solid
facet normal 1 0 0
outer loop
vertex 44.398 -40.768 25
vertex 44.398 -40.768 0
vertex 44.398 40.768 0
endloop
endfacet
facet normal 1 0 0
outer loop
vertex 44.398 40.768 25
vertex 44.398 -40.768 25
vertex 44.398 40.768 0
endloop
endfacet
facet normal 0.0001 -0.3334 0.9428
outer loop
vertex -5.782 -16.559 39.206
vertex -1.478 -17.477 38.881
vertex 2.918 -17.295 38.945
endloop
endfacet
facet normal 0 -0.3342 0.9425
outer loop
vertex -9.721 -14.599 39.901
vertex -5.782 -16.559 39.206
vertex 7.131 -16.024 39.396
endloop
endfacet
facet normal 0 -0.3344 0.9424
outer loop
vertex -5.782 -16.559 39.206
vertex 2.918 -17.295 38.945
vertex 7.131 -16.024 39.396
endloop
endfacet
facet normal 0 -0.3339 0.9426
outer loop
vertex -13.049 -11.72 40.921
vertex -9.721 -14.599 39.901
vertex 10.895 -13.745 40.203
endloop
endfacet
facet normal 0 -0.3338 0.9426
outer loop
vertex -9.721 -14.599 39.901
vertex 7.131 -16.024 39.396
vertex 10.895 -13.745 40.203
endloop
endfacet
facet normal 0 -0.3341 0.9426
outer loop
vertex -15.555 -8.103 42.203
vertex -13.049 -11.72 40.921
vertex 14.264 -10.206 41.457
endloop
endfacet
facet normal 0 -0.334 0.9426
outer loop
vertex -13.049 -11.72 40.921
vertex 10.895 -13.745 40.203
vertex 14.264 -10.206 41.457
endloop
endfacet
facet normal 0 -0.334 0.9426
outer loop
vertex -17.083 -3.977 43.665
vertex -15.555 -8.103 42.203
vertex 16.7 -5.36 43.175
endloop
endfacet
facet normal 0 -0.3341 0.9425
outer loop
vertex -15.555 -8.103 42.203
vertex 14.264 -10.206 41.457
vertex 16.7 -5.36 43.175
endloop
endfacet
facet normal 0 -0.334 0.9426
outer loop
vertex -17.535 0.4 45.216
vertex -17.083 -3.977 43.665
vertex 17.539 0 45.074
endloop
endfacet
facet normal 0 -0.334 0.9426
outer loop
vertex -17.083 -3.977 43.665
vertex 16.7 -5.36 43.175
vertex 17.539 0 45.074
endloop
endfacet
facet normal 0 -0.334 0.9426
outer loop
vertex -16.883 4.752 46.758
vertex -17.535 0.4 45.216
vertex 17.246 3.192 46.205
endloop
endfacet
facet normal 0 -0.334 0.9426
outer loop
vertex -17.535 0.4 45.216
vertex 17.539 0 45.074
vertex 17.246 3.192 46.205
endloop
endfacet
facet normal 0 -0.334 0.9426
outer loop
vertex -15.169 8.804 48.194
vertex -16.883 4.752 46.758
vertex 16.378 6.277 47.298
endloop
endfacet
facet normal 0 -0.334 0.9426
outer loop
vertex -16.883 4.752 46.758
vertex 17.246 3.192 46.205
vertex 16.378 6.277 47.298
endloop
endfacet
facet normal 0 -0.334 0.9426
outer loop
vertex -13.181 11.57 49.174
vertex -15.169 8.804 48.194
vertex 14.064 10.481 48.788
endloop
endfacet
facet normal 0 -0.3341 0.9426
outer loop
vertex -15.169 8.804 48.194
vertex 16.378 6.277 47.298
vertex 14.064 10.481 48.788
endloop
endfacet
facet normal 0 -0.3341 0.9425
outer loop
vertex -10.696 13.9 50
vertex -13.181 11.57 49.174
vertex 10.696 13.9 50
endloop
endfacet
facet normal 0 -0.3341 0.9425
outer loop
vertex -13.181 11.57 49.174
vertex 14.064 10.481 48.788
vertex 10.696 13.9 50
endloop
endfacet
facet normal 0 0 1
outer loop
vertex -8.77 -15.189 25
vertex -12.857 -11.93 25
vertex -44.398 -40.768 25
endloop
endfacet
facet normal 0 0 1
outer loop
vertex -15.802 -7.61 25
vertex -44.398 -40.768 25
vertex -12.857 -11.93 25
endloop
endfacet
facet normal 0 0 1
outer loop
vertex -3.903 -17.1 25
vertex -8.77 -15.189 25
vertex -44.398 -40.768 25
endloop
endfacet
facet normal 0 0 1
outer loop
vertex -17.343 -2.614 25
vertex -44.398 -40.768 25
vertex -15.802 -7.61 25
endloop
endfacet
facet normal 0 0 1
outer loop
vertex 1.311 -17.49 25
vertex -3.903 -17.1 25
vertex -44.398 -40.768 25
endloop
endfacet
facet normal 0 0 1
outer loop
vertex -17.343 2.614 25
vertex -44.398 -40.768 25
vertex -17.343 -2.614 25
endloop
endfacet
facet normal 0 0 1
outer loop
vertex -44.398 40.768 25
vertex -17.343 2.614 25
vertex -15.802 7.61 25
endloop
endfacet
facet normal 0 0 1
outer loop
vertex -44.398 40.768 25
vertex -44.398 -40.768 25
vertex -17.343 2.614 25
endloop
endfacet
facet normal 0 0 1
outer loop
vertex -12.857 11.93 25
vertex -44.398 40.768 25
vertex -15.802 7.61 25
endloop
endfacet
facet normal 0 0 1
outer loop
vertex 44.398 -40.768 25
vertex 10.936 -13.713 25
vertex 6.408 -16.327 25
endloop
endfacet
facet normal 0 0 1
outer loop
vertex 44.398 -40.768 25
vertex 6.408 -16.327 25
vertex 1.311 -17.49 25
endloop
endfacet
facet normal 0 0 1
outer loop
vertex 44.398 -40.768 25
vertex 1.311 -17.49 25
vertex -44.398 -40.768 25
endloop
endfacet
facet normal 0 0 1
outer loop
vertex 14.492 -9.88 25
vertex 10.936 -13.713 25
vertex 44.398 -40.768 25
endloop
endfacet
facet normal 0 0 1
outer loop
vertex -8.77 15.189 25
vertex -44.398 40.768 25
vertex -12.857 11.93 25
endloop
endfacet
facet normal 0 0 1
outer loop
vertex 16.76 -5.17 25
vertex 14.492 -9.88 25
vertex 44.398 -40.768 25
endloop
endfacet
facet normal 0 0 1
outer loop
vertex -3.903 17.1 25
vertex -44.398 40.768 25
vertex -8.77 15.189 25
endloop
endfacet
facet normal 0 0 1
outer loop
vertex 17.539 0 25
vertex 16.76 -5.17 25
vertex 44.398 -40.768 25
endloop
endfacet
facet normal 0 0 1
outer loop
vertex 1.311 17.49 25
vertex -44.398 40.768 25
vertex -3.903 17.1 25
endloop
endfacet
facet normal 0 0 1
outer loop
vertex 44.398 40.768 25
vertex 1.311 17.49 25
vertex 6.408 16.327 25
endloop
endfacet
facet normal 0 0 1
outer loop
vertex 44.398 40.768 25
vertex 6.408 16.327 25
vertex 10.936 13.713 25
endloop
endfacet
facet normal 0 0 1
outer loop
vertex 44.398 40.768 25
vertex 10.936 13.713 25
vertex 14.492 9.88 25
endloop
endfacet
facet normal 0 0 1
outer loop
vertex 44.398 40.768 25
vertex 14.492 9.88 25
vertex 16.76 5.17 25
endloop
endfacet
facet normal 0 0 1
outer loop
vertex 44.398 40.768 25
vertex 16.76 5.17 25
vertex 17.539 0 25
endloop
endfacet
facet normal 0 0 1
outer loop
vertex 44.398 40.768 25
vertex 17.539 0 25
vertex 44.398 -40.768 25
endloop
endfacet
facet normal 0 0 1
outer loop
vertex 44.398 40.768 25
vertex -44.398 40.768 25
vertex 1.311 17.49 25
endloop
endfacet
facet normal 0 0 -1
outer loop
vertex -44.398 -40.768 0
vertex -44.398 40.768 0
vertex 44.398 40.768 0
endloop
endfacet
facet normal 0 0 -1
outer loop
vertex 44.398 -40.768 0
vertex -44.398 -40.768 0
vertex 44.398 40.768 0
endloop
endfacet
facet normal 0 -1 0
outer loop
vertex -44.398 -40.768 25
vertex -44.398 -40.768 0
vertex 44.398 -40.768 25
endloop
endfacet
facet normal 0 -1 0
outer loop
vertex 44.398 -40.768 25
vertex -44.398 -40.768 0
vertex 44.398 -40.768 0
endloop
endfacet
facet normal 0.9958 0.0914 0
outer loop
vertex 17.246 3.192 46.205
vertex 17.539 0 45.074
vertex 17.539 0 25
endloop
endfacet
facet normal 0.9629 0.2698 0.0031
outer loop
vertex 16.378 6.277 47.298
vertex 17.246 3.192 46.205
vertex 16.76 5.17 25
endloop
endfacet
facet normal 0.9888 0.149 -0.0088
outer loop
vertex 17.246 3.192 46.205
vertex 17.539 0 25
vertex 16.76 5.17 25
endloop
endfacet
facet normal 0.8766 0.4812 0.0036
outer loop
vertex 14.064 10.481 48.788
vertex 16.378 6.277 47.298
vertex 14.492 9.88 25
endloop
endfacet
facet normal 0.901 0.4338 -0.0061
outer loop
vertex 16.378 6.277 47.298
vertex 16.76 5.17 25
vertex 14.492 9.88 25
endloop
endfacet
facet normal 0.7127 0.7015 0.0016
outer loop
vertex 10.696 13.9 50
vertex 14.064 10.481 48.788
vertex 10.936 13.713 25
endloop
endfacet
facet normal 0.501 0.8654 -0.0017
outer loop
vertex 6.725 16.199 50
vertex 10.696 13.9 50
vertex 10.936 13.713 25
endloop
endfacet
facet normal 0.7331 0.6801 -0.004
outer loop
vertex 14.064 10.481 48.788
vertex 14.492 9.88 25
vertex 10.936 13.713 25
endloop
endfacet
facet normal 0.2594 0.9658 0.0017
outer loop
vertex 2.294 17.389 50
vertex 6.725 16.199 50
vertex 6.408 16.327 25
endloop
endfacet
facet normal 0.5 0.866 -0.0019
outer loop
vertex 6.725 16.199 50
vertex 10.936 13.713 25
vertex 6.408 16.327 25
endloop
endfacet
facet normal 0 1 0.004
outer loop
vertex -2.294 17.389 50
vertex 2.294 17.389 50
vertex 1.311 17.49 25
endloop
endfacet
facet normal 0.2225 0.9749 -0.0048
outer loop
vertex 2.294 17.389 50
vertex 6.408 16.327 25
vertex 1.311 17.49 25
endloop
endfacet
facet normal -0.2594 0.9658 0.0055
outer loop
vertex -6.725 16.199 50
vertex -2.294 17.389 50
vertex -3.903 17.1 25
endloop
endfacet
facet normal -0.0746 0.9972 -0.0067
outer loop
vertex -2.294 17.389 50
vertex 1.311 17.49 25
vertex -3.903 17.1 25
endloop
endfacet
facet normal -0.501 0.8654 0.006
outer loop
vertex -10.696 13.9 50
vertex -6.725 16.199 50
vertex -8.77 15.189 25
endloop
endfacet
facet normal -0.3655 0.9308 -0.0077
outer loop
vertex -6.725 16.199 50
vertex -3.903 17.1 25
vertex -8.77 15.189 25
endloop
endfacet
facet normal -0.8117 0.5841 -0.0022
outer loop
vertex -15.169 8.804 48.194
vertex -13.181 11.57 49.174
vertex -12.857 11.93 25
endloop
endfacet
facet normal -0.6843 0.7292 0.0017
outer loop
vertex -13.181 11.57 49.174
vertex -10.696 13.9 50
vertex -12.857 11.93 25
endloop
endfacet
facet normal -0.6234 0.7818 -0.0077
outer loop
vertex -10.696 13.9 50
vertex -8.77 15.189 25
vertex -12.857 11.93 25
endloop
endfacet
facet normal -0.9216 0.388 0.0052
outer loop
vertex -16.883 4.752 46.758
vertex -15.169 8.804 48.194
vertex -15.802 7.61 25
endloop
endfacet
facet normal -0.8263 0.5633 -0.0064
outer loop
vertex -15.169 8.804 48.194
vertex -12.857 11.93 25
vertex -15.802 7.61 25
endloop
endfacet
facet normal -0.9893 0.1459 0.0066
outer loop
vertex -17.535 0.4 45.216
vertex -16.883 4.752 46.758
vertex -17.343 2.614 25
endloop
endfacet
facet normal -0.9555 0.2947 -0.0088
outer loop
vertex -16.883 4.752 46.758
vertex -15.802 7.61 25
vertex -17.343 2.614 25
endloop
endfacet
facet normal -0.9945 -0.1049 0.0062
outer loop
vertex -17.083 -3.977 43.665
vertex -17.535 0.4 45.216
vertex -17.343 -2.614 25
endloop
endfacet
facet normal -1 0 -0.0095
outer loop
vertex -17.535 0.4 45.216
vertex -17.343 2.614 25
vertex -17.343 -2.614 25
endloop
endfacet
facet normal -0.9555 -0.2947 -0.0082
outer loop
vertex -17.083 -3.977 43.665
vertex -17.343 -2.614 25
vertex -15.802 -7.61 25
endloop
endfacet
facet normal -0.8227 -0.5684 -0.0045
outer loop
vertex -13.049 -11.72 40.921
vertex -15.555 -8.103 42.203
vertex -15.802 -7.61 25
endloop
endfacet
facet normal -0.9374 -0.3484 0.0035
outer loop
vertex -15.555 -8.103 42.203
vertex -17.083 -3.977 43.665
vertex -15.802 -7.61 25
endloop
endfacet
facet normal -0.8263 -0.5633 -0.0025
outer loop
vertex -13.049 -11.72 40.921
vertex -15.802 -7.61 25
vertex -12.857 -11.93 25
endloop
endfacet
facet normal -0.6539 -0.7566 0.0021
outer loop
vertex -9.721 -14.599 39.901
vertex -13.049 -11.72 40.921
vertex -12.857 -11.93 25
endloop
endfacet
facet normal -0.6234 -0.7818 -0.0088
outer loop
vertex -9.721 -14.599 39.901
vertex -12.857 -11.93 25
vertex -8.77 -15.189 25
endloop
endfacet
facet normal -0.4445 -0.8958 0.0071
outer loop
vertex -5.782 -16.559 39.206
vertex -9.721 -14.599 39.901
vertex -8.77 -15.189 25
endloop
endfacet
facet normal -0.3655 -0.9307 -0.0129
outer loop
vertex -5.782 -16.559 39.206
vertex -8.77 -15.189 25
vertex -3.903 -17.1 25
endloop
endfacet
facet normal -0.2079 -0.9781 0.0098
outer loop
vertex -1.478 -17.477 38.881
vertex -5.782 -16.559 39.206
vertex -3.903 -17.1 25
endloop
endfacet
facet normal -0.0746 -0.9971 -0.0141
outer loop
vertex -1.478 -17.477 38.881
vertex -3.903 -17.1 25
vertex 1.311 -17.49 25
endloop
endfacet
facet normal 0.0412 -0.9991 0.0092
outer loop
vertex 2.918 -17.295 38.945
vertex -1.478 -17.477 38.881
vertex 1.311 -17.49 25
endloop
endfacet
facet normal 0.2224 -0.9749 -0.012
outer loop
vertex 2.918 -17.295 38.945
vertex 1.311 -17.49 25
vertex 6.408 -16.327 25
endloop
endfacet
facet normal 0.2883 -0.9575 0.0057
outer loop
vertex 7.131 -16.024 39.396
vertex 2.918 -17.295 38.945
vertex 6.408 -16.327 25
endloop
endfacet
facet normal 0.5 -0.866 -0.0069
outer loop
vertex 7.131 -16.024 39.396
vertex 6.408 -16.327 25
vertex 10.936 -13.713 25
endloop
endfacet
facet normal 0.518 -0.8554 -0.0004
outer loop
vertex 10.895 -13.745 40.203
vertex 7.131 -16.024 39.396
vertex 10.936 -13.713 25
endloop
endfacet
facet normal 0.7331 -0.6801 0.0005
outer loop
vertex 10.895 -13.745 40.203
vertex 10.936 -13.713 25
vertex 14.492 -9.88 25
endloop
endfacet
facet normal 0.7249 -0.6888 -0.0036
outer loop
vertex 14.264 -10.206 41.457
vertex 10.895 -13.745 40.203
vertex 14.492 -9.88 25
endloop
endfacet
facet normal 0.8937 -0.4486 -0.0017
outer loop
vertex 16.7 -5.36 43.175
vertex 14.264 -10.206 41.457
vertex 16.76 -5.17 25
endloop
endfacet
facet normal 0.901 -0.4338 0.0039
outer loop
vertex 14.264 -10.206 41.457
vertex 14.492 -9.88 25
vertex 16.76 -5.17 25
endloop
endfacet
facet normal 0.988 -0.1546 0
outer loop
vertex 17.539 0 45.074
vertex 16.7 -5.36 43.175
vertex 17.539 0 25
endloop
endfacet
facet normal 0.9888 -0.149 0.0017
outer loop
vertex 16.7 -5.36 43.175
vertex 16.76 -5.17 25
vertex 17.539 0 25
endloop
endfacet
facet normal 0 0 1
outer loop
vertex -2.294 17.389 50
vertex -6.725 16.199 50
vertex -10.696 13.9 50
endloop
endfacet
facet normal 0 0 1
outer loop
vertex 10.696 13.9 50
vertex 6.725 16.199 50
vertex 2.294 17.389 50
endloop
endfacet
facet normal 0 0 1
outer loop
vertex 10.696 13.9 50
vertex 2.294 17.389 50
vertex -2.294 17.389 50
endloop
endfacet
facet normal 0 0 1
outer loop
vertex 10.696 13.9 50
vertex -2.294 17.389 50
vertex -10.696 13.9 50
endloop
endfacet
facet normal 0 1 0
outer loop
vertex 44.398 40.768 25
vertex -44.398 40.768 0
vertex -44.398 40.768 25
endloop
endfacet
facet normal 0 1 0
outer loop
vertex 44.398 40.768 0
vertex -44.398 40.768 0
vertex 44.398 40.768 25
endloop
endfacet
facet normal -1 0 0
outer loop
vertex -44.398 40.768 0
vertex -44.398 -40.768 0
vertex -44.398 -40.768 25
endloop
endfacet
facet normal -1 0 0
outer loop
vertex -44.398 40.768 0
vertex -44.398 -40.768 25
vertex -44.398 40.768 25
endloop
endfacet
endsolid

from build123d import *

# Parameters (mm, degrees)
F0_R     = 17.5393156129
F1_DEPTH = 50
F2_W     = 88.7956470251
F2_H     = 81.5360844135
F3_DEPTH = 25
F5_DEPTH = 25


with BuildPart() as f1:
    # F0 (on Top) → F1 (new body)
    with BuildSketch(Plane.XY):
        Circle(F0_R)
    extrude(amount=F1_DEPTH)

    # F2 (on Top) → F3 (join)
    with BuildSketch(Plane.XY):
        Rectangle(F2_W, F2_H)
    extrude(amount=F3_DEPTH)

    # F4 (on Right) → F5 (cut, symmetric)
    with BuildSketch(Plane.YZ):
        Polygon((-20.2884618193, 37.8846153617), (19.3269234151, 51.9230812788), (-20.2884618193, 53.4615404904), align=None)
    extrude(amount=F5_DEPTH, both=True, mode=Mode.SUBTRACT)


solid = f1.part
